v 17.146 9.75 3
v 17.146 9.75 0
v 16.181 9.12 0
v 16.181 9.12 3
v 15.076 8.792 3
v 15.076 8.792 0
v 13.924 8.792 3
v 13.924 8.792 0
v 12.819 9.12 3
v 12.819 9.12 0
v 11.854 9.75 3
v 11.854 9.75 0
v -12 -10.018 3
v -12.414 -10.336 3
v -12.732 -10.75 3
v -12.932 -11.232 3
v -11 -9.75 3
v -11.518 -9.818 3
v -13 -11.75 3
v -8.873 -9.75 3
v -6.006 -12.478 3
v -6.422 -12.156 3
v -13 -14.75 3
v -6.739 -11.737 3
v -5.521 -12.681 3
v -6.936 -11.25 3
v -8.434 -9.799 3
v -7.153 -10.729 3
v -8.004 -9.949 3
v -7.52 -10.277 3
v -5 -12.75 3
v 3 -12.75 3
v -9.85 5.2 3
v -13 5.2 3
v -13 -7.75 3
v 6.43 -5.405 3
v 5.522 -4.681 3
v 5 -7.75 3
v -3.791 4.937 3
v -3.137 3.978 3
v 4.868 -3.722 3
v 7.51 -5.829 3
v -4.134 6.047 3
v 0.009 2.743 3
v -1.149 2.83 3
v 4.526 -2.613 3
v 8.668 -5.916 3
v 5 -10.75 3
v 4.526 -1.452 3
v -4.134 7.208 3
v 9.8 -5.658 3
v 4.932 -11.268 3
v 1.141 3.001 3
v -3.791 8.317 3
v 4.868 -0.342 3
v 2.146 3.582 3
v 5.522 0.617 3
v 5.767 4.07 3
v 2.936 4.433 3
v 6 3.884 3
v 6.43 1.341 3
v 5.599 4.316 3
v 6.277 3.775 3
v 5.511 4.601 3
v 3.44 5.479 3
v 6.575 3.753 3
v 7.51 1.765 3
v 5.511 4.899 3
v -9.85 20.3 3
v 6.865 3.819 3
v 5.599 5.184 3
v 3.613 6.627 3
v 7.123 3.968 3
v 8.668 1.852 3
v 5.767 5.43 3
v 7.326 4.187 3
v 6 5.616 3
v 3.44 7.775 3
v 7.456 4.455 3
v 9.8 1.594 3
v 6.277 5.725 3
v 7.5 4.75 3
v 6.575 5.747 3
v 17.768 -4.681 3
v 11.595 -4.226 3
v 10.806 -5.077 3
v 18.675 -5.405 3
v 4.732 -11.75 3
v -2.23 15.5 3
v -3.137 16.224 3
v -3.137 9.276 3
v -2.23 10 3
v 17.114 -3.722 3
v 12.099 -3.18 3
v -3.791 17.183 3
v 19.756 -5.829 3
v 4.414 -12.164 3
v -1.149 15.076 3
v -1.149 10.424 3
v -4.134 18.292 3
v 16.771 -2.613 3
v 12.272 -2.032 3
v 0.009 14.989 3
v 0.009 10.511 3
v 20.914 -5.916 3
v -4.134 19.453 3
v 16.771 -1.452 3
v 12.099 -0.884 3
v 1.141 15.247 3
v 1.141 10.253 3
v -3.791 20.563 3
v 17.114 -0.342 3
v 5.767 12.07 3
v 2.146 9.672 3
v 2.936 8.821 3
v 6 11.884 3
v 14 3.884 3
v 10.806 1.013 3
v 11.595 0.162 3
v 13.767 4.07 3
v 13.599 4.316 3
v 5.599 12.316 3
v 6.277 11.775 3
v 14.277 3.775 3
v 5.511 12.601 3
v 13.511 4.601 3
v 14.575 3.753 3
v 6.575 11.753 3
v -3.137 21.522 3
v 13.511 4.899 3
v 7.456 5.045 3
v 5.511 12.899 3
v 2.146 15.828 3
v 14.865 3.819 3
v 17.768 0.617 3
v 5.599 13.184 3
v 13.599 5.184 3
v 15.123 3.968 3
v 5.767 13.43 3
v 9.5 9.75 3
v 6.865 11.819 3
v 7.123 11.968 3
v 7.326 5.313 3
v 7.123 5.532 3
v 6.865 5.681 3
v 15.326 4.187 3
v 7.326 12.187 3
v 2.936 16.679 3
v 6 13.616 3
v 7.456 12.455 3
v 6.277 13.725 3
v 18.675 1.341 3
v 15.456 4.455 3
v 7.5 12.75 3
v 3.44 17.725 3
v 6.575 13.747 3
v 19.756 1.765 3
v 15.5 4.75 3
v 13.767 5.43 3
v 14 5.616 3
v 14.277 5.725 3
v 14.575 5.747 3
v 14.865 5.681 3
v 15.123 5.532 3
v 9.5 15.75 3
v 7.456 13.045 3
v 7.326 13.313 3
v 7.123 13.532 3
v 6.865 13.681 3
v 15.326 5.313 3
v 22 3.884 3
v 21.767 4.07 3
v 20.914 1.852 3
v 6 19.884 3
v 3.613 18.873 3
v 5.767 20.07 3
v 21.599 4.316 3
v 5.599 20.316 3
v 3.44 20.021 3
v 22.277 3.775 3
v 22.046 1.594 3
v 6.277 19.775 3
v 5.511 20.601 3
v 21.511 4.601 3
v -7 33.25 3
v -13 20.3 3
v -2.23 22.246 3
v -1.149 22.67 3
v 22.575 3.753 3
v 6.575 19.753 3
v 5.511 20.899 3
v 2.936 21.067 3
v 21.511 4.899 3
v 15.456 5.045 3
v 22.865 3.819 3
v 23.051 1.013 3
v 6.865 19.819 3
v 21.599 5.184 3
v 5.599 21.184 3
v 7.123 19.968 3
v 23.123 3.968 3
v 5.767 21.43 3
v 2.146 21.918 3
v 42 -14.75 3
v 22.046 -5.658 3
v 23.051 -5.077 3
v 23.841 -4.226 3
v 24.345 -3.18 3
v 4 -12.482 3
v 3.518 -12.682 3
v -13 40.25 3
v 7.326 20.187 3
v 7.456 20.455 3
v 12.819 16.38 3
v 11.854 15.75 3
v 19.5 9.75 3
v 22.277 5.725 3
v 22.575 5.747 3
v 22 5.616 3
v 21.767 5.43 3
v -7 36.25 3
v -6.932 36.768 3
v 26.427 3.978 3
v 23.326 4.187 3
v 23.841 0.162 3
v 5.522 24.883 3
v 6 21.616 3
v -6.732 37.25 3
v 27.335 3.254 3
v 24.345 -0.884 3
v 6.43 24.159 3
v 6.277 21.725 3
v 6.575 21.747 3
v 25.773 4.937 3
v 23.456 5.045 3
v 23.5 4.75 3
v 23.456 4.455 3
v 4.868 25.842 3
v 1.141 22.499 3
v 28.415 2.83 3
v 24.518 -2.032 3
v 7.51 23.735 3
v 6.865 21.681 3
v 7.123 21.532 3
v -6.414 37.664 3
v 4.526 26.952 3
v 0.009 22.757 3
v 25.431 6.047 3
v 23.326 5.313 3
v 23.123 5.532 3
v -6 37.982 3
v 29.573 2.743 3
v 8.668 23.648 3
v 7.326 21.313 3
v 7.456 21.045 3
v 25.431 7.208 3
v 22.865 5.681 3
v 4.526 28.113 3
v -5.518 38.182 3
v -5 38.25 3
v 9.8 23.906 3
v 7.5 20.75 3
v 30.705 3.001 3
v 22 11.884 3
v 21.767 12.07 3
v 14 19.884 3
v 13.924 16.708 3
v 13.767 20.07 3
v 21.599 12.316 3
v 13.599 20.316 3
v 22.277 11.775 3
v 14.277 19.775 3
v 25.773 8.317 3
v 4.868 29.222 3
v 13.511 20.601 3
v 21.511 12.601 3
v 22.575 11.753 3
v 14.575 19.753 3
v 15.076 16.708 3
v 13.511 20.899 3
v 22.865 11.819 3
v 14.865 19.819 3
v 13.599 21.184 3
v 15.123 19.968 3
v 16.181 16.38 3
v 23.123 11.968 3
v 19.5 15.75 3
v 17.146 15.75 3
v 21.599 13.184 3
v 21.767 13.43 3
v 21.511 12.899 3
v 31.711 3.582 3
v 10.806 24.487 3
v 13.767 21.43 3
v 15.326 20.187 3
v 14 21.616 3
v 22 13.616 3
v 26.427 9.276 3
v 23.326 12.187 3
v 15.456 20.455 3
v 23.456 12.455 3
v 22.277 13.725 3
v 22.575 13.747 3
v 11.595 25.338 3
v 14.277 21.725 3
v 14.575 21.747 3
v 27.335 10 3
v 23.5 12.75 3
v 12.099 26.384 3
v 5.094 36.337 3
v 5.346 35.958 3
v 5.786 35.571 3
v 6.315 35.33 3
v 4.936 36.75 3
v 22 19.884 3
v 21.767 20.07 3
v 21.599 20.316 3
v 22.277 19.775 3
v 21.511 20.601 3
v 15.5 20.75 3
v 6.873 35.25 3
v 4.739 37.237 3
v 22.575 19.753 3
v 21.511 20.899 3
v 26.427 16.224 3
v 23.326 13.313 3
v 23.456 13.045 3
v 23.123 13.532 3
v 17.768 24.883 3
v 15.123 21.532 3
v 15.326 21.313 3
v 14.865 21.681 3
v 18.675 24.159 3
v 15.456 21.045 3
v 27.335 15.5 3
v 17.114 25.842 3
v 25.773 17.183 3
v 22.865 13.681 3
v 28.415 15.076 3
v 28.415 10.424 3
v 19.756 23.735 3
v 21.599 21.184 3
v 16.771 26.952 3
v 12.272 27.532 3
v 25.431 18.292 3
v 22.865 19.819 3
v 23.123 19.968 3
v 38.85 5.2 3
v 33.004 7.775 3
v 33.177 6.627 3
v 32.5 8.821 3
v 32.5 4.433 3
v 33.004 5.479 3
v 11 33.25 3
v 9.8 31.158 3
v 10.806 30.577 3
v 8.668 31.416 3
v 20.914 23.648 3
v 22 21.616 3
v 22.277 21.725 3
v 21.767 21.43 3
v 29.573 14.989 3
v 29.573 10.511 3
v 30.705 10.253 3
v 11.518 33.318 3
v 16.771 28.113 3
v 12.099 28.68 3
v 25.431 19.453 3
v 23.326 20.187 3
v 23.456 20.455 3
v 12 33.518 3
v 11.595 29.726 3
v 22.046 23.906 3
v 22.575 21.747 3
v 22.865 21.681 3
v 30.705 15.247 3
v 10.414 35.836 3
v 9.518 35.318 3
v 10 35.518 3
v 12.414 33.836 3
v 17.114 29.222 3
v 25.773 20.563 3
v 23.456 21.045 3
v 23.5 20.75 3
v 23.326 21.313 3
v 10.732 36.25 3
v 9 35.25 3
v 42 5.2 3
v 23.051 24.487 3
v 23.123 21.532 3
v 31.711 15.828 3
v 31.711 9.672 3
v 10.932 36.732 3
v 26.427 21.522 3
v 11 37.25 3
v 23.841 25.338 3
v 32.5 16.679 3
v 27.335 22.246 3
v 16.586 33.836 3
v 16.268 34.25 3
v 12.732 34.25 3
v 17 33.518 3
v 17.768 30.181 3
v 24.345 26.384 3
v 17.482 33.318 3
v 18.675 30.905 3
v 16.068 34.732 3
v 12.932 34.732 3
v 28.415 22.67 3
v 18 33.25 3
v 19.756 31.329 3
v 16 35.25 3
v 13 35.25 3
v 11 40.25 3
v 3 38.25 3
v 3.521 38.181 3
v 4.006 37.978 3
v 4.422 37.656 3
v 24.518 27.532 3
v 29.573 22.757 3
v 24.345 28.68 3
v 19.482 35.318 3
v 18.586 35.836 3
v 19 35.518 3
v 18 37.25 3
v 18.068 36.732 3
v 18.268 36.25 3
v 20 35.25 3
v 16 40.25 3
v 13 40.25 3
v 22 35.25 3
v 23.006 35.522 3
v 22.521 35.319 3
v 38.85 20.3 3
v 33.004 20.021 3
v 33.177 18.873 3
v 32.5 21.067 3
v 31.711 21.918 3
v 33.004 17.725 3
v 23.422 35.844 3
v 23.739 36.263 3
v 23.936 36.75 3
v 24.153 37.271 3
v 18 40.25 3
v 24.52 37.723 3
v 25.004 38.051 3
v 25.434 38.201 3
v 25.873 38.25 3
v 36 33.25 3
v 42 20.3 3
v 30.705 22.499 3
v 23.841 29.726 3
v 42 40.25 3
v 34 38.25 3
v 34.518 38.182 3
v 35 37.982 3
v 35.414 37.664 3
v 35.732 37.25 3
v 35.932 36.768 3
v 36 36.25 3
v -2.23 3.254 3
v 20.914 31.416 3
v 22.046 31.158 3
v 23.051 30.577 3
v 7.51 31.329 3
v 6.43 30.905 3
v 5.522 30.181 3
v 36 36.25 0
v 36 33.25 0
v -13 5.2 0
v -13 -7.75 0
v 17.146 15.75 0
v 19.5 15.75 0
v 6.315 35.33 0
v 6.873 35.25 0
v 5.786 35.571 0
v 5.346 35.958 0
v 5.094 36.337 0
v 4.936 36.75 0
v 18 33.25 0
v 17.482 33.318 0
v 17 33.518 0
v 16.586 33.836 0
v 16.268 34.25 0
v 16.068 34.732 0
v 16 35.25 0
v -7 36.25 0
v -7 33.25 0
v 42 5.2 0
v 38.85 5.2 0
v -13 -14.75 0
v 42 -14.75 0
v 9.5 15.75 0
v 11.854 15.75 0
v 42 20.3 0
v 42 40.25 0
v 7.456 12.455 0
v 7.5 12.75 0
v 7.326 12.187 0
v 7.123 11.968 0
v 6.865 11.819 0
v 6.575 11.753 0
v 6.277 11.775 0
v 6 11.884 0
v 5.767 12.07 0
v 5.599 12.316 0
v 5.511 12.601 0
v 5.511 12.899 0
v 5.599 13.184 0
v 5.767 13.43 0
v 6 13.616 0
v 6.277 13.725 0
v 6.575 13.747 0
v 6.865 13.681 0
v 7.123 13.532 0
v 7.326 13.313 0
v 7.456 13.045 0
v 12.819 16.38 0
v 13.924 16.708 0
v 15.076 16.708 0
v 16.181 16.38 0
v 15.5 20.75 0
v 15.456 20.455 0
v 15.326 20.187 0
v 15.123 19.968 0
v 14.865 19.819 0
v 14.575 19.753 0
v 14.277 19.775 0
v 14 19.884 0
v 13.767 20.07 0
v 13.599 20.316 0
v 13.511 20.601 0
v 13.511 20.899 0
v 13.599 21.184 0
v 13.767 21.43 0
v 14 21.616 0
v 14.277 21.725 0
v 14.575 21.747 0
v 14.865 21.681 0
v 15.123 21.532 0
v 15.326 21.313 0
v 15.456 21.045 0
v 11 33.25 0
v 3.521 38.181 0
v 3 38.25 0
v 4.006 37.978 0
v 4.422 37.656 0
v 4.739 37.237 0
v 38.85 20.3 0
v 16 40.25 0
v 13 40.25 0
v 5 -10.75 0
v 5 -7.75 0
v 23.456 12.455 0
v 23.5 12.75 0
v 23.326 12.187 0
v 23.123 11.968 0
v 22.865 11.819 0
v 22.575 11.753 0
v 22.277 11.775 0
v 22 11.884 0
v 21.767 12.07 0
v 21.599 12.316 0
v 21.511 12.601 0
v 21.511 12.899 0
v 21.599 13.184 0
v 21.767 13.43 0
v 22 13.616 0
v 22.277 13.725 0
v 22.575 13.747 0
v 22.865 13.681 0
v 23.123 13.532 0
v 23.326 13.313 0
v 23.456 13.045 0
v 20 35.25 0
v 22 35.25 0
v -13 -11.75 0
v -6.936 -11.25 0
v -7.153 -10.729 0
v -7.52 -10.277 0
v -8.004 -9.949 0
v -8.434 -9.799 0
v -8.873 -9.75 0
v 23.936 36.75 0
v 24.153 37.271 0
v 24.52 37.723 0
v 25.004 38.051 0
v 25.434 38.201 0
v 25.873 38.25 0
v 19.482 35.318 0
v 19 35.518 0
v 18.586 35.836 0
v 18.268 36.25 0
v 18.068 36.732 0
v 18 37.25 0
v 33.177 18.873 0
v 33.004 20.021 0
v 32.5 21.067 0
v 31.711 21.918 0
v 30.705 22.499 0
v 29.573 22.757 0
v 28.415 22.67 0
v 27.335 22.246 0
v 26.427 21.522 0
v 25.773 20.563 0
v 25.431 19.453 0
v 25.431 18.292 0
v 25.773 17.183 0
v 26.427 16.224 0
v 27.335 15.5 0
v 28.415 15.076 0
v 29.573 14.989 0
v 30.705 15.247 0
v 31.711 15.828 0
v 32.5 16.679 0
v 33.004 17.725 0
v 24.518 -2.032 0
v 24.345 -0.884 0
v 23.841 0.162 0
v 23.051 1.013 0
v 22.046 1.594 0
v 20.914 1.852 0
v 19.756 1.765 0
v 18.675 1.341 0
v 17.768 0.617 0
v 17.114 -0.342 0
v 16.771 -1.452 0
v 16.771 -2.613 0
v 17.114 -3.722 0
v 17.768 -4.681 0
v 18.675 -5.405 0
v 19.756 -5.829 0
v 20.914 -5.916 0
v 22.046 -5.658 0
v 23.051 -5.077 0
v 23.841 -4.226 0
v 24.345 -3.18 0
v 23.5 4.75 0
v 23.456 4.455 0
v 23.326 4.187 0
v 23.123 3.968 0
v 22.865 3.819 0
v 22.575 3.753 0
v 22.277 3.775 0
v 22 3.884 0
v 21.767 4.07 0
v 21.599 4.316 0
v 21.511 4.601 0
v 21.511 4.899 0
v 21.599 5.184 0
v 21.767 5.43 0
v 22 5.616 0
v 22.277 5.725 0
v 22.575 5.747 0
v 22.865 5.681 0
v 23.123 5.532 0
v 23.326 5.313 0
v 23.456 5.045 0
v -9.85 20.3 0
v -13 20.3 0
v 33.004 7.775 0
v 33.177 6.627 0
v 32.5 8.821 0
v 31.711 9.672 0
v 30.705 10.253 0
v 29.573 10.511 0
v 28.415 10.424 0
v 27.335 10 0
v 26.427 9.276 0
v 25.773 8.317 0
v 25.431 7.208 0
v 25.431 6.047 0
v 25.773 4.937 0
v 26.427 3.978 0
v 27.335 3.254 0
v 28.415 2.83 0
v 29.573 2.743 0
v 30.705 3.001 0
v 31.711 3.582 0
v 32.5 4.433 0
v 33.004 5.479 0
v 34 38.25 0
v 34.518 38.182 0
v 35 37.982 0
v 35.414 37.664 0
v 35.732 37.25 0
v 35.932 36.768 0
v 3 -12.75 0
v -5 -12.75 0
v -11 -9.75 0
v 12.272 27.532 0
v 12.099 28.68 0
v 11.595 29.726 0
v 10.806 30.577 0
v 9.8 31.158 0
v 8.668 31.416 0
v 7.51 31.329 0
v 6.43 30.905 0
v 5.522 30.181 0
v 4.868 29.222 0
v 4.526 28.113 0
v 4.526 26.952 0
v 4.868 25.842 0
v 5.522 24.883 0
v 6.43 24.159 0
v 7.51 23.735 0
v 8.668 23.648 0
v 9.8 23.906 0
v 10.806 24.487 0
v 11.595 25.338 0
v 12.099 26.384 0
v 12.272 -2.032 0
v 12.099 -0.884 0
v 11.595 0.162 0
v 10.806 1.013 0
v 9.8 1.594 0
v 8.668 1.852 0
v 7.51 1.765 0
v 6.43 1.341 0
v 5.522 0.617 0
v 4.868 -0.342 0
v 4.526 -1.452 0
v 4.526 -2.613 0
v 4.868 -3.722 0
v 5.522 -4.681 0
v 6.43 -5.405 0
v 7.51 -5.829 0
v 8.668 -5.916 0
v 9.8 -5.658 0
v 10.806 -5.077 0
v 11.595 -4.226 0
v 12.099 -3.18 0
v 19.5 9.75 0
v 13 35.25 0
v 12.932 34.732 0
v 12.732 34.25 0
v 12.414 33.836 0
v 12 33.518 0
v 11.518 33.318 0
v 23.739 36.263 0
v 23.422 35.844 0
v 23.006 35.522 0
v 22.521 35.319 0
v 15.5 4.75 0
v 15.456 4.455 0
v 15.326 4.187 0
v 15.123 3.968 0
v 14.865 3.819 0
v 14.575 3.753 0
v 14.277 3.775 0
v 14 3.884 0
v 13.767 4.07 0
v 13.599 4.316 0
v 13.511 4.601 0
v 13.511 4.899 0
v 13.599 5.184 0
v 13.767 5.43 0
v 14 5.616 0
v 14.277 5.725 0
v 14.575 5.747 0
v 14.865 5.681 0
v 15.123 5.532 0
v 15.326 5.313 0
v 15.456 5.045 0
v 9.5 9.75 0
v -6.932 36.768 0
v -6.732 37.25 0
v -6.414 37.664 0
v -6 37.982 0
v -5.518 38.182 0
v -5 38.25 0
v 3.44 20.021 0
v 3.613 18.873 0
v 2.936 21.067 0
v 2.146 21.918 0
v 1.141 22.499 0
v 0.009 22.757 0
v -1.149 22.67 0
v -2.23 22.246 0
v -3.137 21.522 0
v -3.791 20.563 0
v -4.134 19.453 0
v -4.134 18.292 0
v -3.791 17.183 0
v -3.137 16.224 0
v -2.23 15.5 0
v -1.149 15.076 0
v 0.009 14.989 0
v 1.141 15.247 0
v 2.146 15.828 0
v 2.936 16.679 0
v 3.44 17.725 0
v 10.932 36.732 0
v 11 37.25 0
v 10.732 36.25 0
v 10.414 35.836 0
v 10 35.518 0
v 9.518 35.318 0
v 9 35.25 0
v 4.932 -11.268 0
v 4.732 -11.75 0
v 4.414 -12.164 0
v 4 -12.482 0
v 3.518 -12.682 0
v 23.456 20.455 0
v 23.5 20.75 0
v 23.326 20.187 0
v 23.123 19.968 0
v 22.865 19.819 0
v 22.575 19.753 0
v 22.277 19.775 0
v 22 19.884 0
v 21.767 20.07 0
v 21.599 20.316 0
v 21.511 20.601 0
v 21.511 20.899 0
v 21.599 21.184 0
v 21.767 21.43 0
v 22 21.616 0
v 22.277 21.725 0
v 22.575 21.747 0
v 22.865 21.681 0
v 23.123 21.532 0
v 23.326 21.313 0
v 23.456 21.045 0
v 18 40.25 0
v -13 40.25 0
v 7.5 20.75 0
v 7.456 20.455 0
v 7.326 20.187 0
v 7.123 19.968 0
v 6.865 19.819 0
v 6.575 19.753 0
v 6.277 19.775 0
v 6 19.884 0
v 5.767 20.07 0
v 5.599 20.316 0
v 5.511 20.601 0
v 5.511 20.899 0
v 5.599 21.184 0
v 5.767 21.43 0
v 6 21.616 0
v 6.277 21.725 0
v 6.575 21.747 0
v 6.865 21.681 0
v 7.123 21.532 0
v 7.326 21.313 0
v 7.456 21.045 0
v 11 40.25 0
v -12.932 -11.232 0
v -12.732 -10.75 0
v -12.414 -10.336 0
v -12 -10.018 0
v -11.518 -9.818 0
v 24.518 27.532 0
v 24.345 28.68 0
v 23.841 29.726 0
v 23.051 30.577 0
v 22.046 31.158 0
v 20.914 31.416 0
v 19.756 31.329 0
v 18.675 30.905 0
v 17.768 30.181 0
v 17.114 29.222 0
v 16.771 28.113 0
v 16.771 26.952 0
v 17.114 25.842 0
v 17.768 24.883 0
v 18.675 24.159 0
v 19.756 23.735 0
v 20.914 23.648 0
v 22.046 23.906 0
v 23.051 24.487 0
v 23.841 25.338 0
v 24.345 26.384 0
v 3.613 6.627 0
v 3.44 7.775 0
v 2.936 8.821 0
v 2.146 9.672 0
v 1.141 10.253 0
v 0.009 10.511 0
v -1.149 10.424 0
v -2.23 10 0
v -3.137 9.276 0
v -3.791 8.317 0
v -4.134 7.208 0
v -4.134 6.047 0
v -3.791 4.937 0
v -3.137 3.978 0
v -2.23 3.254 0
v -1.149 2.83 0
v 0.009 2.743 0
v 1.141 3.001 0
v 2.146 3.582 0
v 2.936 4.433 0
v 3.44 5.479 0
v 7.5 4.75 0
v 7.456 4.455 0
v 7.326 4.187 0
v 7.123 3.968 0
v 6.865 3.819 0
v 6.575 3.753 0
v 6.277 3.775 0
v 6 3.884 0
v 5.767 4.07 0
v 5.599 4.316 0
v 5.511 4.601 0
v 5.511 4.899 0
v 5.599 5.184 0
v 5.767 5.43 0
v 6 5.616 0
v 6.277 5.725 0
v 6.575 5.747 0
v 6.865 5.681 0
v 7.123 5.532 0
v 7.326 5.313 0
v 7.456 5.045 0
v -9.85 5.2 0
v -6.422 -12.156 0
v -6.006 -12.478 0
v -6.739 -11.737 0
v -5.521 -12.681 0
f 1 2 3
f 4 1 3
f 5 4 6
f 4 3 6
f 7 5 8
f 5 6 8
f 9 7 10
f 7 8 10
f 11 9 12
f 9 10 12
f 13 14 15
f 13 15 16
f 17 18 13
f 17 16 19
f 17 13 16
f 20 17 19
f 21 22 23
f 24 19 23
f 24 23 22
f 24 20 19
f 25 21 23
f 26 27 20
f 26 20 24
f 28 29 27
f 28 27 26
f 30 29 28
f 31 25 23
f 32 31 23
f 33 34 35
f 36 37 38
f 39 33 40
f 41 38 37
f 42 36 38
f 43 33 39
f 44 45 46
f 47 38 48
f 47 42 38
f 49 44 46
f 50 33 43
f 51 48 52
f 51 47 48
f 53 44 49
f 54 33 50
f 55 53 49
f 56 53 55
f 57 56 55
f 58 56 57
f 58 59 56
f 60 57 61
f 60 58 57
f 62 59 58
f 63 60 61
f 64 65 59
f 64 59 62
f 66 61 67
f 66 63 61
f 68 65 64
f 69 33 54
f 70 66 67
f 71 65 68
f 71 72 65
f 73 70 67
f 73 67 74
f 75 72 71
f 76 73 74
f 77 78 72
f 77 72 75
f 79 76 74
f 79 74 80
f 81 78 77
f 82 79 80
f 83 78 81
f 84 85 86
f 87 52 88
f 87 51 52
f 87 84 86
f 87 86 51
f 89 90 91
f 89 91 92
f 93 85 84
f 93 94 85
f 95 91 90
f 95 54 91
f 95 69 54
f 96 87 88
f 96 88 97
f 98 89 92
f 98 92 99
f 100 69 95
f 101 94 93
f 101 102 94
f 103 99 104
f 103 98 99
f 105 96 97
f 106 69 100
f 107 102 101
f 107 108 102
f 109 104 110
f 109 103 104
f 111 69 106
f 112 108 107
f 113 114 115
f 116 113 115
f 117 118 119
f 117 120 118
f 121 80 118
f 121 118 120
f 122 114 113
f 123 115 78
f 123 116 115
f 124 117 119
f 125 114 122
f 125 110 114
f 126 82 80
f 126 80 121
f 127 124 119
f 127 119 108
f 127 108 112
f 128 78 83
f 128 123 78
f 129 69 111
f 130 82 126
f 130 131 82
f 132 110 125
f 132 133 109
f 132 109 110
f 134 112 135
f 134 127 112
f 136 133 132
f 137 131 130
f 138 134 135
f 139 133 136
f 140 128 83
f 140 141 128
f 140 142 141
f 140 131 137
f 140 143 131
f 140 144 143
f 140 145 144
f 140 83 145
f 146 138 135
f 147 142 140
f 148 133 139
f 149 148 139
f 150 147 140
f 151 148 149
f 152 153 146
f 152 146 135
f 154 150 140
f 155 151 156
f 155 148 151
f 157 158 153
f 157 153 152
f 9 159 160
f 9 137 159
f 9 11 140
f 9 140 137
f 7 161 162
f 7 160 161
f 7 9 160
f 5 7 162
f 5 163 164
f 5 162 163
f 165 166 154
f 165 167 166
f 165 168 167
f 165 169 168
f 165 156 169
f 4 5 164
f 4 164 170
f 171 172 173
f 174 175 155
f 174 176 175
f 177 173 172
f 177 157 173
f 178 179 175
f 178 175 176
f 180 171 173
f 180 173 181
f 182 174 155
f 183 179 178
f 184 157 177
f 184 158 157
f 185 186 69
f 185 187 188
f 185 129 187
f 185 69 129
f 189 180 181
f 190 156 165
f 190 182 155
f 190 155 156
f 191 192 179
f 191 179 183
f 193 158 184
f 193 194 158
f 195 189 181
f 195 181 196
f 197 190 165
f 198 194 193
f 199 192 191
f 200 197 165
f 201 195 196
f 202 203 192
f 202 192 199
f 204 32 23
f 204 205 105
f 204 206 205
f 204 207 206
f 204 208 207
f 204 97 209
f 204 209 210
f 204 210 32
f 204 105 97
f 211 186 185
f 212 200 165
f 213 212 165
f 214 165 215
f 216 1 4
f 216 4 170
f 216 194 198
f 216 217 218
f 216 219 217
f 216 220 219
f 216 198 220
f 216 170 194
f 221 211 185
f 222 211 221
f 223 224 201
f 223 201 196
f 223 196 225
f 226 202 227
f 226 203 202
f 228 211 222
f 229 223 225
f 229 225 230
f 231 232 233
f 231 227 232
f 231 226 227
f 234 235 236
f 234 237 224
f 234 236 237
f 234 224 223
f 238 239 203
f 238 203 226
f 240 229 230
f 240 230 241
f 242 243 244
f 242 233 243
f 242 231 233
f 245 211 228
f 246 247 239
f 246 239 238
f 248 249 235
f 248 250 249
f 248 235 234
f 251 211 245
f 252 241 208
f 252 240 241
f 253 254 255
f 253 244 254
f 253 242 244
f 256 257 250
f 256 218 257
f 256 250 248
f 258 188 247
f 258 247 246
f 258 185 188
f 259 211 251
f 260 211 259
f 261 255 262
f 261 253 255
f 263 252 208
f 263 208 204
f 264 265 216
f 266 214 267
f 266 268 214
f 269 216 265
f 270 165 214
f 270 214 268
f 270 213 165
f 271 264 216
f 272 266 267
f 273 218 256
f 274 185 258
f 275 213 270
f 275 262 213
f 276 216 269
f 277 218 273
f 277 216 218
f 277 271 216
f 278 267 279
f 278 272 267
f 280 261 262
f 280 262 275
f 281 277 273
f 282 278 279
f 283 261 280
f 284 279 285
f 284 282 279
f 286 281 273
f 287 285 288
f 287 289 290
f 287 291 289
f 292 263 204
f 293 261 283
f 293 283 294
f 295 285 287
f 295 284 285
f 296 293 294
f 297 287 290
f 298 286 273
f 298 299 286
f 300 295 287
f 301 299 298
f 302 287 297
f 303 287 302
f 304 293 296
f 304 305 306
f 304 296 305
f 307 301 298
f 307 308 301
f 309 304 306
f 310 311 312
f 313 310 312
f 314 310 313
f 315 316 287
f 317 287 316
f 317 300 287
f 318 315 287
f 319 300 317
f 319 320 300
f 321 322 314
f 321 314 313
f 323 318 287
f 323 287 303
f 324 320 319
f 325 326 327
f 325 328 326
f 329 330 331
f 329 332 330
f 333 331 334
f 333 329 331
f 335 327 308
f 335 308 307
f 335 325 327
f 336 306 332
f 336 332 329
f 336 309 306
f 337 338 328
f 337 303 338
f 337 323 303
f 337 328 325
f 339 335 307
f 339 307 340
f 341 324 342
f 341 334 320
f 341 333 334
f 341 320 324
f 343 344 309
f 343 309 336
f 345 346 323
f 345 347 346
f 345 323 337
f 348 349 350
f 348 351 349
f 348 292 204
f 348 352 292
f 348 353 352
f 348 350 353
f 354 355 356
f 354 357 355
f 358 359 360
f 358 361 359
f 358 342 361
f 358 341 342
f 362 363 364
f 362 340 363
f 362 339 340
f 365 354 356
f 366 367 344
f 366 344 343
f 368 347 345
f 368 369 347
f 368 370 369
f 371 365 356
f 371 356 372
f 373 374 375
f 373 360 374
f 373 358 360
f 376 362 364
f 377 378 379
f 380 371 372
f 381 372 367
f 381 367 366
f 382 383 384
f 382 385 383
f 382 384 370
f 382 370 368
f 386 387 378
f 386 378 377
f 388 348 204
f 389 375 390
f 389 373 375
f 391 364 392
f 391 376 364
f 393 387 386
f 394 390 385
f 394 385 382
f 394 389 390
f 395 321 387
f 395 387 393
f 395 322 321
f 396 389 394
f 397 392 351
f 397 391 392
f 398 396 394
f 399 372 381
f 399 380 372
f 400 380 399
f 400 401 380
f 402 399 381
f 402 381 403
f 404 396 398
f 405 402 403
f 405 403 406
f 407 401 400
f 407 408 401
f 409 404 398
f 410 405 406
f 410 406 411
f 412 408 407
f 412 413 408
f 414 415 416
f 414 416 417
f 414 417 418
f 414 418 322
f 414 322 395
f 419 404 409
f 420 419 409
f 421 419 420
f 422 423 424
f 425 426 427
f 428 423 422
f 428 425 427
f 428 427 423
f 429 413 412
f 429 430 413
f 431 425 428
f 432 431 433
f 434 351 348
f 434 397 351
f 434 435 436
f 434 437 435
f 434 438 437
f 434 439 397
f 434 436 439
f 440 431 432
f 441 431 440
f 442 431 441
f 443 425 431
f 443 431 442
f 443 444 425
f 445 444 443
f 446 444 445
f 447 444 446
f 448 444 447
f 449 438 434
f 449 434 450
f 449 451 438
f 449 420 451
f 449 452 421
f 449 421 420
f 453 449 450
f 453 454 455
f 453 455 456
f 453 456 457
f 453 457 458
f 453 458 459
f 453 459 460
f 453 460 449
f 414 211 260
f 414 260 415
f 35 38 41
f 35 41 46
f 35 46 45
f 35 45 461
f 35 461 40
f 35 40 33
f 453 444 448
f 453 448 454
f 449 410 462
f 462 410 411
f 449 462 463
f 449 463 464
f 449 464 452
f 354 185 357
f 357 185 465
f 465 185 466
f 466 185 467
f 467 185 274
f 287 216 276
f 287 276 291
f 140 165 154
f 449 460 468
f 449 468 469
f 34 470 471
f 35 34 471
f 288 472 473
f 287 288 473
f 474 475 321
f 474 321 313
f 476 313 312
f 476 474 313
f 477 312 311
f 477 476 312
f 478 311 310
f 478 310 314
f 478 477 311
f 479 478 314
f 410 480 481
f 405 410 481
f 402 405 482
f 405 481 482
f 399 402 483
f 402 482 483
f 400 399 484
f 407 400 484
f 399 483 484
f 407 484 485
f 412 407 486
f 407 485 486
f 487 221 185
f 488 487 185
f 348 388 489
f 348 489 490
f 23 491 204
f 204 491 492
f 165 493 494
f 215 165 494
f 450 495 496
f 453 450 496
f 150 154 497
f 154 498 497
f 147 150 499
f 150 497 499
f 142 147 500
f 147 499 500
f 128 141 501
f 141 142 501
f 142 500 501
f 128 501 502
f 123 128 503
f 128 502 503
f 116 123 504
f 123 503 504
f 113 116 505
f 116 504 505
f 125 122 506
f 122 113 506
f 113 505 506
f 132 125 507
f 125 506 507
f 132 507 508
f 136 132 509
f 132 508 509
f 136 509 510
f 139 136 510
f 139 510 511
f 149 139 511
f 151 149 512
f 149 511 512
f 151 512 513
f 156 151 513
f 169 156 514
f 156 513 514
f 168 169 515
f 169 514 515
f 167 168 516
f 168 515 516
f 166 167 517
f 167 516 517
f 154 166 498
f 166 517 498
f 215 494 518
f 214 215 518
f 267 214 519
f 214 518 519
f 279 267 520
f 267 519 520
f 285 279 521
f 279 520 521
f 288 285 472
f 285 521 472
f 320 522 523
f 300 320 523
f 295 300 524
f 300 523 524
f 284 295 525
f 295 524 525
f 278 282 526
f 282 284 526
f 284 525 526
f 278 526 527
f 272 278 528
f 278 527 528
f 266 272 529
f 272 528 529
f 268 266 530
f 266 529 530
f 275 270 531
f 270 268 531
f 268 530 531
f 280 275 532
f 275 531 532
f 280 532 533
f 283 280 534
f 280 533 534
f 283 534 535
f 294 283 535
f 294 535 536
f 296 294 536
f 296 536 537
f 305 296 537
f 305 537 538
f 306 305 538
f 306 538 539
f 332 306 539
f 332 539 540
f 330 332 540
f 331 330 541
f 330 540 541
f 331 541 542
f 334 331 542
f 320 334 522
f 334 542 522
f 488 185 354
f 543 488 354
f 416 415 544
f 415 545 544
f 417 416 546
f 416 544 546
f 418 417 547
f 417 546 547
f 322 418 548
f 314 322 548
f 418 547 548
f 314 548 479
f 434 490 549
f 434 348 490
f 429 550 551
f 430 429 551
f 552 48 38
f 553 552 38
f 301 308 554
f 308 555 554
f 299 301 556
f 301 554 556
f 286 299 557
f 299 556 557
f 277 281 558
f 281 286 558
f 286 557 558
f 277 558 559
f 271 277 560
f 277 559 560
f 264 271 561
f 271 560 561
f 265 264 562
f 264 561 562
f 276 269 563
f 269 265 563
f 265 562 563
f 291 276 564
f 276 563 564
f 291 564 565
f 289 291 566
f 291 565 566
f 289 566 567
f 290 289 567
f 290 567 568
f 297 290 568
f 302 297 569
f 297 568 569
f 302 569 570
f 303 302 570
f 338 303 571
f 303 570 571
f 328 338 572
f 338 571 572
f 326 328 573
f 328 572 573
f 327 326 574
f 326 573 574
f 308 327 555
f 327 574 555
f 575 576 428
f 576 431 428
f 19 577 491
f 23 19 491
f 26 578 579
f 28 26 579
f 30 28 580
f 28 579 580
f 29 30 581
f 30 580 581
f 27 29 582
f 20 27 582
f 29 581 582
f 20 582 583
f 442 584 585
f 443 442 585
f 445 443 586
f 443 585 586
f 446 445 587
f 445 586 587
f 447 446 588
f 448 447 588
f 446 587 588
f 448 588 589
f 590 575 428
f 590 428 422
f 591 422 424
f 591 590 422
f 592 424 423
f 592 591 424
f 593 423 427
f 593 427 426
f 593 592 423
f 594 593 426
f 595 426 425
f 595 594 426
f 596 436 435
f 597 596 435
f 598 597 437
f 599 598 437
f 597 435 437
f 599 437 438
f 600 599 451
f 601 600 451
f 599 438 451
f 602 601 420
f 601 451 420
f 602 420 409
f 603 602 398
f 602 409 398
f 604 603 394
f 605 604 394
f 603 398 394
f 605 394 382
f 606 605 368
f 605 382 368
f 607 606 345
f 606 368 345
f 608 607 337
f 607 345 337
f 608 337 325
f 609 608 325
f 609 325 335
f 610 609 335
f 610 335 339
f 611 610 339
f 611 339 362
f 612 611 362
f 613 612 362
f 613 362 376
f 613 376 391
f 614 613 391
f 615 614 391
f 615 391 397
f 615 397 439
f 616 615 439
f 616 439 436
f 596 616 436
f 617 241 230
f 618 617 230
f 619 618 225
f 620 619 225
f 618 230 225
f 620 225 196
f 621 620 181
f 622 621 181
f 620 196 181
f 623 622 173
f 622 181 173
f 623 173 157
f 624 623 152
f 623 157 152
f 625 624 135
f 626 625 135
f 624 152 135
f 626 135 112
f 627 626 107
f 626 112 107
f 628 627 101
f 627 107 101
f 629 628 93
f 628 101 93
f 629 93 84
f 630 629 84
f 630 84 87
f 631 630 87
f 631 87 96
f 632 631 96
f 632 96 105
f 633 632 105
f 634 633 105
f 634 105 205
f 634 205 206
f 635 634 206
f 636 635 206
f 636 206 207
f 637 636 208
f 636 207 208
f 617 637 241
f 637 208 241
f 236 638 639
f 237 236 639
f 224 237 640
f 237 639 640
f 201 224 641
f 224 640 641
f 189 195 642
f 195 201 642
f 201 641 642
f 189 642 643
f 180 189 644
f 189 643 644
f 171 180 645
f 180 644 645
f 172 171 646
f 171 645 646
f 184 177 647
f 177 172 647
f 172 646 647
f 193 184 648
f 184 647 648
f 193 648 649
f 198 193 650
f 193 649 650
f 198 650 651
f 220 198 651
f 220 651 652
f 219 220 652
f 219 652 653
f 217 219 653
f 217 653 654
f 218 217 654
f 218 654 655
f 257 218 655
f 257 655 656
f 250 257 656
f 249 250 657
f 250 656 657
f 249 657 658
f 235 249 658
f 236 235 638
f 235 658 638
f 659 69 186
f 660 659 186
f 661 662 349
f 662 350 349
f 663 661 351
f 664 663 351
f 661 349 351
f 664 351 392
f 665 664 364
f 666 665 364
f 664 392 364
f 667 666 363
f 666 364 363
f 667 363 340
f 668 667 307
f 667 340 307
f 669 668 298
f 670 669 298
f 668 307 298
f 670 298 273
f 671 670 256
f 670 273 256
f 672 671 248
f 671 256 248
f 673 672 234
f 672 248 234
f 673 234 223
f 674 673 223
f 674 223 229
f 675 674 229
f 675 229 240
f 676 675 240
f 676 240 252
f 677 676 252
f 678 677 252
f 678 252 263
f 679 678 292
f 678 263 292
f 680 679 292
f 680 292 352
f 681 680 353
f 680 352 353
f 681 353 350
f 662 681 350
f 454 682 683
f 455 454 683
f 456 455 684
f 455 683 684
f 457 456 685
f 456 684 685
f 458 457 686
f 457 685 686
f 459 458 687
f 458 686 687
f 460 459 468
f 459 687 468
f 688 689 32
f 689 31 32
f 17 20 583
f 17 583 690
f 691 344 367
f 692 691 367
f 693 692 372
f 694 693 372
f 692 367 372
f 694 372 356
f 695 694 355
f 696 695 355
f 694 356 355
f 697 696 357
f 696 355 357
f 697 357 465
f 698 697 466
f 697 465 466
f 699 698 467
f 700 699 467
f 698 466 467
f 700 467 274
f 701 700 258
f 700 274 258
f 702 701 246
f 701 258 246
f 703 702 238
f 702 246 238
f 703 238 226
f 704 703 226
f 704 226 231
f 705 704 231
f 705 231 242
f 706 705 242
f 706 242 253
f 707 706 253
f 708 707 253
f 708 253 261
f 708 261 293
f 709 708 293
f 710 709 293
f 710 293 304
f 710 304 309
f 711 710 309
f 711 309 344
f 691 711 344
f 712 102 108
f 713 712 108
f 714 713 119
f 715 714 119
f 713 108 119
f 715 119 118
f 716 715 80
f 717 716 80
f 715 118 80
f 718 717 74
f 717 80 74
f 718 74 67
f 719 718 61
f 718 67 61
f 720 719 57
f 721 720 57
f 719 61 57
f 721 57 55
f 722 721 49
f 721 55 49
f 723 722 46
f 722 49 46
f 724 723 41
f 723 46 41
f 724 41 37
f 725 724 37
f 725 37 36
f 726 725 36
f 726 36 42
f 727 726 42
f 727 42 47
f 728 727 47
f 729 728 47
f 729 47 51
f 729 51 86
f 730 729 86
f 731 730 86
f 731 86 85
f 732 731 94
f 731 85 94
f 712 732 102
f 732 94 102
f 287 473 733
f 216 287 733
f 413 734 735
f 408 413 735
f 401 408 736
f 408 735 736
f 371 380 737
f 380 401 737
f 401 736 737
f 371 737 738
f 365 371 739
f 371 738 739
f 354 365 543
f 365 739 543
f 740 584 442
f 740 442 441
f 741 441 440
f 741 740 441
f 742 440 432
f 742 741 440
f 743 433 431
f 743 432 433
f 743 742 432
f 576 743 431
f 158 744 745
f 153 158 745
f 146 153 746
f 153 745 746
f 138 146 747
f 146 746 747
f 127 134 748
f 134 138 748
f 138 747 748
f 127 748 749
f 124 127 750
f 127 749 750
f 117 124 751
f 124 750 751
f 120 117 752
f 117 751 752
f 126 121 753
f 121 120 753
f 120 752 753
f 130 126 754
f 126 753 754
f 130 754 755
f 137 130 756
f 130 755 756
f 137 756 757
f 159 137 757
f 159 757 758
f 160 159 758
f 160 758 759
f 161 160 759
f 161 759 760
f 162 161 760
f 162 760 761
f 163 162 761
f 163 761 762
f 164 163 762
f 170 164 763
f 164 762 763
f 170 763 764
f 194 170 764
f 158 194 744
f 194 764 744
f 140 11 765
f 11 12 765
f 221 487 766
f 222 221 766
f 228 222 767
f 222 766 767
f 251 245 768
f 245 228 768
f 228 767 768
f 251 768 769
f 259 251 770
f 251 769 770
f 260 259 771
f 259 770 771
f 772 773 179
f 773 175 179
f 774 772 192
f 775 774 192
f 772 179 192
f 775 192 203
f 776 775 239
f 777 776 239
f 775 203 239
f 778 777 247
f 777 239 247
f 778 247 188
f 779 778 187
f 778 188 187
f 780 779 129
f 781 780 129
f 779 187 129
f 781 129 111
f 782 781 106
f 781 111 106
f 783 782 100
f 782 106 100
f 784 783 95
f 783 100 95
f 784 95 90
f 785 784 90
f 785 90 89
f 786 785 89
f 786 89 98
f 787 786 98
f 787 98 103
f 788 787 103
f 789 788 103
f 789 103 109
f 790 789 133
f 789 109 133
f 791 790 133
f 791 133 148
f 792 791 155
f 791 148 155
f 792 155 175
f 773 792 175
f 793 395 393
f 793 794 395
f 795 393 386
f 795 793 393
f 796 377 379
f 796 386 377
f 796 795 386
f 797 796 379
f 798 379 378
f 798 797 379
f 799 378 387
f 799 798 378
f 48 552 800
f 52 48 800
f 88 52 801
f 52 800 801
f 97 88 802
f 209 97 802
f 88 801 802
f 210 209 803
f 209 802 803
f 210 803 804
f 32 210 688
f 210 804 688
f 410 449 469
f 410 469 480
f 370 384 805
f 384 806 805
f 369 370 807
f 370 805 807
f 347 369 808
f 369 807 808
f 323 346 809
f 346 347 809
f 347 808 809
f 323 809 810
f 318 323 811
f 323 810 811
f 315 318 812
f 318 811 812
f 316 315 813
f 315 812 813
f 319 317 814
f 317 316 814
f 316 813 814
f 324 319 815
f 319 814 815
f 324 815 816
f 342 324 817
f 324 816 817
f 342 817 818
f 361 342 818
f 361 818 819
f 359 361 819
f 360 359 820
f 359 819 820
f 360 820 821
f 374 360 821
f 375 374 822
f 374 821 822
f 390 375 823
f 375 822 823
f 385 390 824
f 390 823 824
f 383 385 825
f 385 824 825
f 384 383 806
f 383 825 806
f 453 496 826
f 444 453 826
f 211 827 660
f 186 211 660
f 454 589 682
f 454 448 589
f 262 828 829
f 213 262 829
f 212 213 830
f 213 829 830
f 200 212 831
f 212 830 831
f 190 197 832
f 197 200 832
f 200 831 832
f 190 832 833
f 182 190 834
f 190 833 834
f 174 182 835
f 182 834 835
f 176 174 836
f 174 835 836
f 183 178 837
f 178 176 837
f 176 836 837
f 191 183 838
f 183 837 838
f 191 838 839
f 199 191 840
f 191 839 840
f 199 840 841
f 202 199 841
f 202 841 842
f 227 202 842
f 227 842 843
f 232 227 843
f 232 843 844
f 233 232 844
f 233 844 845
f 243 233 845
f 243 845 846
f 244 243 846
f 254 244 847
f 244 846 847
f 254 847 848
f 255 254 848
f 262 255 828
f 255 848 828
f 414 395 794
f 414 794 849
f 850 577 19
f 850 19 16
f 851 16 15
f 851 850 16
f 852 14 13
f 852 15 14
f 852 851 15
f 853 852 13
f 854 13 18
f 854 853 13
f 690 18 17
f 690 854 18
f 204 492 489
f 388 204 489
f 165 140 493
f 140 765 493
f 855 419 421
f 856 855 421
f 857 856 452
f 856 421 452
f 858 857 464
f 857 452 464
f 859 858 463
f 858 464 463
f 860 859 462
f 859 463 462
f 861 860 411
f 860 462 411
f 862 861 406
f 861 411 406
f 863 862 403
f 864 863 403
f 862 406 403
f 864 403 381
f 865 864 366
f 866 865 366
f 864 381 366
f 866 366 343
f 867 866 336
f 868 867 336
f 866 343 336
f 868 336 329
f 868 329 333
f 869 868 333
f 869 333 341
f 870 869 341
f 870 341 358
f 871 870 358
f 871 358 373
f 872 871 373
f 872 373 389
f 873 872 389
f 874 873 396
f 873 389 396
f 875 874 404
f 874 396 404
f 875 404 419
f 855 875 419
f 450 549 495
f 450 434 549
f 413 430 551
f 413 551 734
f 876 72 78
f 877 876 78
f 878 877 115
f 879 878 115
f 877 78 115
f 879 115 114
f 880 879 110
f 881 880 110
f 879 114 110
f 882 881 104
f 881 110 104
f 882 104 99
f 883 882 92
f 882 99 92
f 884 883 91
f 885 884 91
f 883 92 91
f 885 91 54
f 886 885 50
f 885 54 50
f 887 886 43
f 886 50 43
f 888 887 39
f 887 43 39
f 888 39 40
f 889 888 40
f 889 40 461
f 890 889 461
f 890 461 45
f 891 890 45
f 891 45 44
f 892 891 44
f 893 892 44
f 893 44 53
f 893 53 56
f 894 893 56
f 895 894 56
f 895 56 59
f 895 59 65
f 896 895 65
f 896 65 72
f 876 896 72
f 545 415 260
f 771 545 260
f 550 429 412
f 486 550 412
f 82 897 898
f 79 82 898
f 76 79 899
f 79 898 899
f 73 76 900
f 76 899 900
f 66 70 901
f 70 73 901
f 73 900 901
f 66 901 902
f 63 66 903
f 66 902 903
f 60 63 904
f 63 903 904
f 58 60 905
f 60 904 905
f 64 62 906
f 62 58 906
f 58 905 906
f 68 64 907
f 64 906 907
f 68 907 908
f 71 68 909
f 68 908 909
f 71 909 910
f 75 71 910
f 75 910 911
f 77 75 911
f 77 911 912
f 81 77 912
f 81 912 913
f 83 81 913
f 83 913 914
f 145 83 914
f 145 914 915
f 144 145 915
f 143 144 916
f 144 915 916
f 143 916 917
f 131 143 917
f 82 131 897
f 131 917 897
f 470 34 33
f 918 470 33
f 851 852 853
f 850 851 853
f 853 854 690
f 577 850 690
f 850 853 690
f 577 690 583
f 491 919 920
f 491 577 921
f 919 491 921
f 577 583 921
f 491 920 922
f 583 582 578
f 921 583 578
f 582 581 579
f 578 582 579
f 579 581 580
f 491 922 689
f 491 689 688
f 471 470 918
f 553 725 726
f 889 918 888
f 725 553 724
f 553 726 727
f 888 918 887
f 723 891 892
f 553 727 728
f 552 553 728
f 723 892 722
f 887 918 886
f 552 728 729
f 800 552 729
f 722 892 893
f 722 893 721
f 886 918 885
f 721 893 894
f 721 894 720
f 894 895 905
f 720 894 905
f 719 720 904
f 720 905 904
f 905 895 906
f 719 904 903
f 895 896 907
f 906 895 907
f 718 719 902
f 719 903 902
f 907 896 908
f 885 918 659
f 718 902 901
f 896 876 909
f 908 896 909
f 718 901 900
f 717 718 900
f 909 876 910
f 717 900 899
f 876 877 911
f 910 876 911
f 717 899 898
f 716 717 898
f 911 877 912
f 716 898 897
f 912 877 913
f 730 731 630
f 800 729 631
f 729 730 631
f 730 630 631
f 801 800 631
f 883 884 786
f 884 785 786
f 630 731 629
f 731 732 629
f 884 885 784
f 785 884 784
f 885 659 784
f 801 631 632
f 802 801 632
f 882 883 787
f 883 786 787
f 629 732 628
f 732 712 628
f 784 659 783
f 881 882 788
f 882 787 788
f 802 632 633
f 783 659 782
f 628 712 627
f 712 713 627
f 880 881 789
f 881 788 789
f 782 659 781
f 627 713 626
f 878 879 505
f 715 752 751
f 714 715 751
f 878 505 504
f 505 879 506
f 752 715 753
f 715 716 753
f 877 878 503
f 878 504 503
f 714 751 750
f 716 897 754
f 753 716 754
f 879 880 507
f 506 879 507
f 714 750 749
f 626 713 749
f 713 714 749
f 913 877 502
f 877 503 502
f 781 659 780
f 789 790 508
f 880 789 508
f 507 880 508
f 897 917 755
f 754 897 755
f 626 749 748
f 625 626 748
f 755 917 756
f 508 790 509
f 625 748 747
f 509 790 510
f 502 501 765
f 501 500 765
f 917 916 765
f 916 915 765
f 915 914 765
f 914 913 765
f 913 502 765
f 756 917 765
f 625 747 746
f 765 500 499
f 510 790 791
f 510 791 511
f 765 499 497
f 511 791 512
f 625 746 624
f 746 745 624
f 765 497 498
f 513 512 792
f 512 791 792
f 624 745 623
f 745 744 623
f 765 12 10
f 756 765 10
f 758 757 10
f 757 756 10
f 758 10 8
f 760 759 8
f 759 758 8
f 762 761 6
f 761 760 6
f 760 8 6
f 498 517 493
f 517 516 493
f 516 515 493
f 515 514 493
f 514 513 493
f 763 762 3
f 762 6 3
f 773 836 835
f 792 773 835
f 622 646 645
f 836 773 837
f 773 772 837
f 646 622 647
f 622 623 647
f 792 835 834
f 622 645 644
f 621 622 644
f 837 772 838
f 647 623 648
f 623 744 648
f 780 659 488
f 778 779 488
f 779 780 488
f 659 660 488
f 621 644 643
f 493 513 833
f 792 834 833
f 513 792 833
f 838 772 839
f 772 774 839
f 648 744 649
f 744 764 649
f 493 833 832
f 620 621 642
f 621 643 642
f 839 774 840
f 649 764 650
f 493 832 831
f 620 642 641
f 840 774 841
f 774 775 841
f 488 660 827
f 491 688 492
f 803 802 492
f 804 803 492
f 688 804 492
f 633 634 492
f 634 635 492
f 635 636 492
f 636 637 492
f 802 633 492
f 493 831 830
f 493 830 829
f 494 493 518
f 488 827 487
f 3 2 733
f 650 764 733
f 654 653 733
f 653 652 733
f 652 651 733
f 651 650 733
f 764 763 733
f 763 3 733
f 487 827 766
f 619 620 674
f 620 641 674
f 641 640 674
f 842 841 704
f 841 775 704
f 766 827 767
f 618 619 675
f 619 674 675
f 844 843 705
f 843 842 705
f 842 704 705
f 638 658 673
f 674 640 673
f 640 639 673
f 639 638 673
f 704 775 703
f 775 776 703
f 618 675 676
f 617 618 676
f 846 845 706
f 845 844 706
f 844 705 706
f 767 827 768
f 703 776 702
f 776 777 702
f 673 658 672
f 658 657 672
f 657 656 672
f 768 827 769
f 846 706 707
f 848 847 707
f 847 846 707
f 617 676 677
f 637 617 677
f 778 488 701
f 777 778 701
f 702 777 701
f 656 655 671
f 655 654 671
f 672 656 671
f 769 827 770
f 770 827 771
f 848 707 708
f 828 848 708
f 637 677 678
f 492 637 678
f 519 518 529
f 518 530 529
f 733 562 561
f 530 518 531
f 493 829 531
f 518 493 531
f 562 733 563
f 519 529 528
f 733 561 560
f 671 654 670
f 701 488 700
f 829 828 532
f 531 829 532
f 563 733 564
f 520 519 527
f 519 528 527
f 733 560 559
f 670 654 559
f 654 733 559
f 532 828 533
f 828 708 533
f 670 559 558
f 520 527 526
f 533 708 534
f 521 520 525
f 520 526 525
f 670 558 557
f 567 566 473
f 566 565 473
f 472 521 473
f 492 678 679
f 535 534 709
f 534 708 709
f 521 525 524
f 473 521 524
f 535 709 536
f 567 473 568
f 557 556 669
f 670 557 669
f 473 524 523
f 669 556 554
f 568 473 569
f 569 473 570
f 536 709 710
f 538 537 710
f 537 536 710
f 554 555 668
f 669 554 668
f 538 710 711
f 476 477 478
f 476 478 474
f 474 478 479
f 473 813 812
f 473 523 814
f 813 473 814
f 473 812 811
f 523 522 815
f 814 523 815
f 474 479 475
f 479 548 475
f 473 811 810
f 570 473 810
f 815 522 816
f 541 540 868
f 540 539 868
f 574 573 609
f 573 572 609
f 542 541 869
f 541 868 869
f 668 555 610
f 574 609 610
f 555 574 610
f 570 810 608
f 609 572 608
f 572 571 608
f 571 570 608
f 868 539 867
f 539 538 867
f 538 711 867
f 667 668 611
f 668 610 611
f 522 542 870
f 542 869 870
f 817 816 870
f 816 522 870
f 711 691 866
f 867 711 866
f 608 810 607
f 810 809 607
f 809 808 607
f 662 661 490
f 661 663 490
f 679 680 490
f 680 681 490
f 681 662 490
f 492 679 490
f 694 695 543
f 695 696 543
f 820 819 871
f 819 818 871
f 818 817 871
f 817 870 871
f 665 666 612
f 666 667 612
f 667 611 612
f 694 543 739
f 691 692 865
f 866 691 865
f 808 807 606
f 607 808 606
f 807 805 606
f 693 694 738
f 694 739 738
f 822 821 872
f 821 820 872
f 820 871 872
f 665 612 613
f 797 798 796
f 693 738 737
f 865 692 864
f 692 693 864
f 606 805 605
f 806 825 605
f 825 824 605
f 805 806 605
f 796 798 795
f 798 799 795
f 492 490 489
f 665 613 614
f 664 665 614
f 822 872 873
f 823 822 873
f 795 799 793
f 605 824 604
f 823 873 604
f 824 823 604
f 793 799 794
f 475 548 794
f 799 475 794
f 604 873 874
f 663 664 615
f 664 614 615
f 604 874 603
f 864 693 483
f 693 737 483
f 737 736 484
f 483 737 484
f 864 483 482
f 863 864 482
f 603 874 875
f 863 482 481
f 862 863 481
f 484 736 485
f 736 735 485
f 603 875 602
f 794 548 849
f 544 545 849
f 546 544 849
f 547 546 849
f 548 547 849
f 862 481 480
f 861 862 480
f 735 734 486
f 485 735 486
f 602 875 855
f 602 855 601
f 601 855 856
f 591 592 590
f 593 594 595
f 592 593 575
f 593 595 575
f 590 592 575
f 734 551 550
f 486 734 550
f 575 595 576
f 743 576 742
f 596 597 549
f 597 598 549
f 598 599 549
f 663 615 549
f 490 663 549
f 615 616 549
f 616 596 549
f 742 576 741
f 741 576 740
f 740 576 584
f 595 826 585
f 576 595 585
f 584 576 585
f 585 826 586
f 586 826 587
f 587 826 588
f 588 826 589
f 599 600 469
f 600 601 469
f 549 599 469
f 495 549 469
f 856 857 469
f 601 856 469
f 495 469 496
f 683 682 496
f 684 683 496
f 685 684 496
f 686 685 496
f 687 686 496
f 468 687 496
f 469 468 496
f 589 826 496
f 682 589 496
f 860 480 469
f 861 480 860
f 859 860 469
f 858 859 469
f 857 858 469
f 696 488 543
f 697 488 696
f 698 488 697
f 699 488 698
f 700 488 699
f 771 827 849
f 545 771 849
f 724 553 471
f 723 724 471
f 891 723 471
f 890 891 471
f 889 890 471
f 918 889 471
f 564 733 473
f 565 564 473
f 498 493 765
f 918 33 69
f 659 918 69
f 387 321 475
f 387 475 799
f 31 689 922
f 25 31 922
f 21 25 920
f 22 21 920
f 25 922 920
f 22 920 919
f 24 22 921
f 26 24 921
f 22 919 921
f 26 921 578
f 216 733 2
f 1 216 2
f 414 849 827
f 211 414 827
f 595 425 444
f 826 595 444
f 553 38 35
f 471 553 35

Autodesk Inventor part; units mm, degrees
ref_plane "YZ Plane" through (0, 0, 0) normal (1, 0, 0) x (0, 1, 0)
ref_plane "XZ Plane" through (0, 0, 0) normal (0, 1, 0) x (-1, 0, 0)
ref_plane "XY Plane" through (0, 0, 0) normal (0, 0, 1) x (1, 0, 0)
ref_plane "Work Plane1" through (0, 0, 0) normal (0, 0, 1) x (1, 0, 0)
sketch "Sketch1" plane through (0, 0, 0) normal (0, 0, 1) x (1, 0, 0)
  circle A0 centre (6.5, 20.75) radius 1
  circle A1 centre (6.5, 4.75) radius 1
  circle A2 centre (22.5, 20.75) radius 1
  circle A3 centre (22.5, 4.75) radius 1
  line L0 (-13, -14.75) -> (42, -14.75)
  line L1 (42, -14.75) -> (42, 40.25)
  line L2 (42, 40.25) -> (-13, 40.25)
  line L3 (-13, 40.25) -> (-13, -14.75)
  line L4 (-13, -14.75) -> (42, 40.25) construction
  line L5 (42, -14.75) -> (-13, 40.25) construction
  circle A4 centre (22.5, 12.75) radius 1 projected
  circle A5 centre (14.5, 20.75) radius 1 projected
  circle A6 centre (14.5, 4.75) radius 1 projected
  circle A7 centre (6.5, 12.75) radius 1 projected
  line L6 (19.5, 15.75) -> (19.5, 9.75)
  line L7 (17.1458, 15.75) -> (19.5, 15.75)
  arc A8 (17.1458, 15.75) -> (11.8542, 15.75) centre (14.5, 12.75) ccw
  line L8 (9.5, 15.75) -> (11.8542, 15.75)
  line L9 (9.5, 9.75) -> (9.5, 15.75)
  line L10 (11.8542, 9.75) -> (9.5, 9.75)
  arc A9 (11.8542, 9.75) -> (17.1458, 9.75) centre (14.5, 12.75) ccw
  line L11 (19.5, 9.75) -> (17.1458, 9.75)
  point P0 (0, 0)
  dimension "d0" = 55
  dimension "d1" = 55
  dimension "d95" = 2
  dimension "d96" = 2
  dimension "d97" = 2
  dimension "d98" = 2
extrude "Extrusion3" add sketch "Sketch1" along normal blind 3
sketch "Sketch4" plane through (0, 0, 3) normal (0, 0, 1) x (1, 0, 0)
  line L0 (14.5, 40.25) -> (14.5, 12.75) construction
  line L1 (-13, -14.75) -> (42, -14.75) construction
  line L2 (-13, 12.75) -> (14.5, 12.75) construction
  line L3 (5, 38.25) -> (-7, 38.25)
  line L4 (-7, 38.25) -> (-7, 33.25)
  line L5 (-7, 33.25) -> (13, 33.25)
  line L6 (13, 40.25) -> (13, 33.25)
  line L7 (-7, -12.75) -> (5, -12.75)
  line L8 (5, -12.75) -> (5, -7.75)
  line L9 (5, -7.75) -> (-13, -7.75)
  line L10 (-13, -14.75) -> (-13, -7.75)
  line L11 (-13, -14.75) -> (5.3284, -14.75)
  line L12 (14.5, 12.75) -> (20.6229, 27.5321)
  line L13 (14.5, 12.75) -> (30.5, 12.75) construction
  circle A0 centre (20.6229, 27.5321) radius 3.895
  circle A1 centre (8.3771, 27.5321) radius 3.895
  circle A2 centre (-0.2821, 18.8729) radius 3.895
  circle A3 centre (-0.2821, 6.6271) radius 3.895
  circle A4 centre (8.3771, -2.0321) radius 3.895
  circle A5 centre (20.6229, -2.0321) radius 3.895
  circle A6 centre (29.2821, 6.6271) radius 3.895
  circle A7 centre (29.2821, 18.8729) radius 3.895
  line L14 (-7, -12.75) -> (-7, -9.75)
  line L15 (-7, -9.75) -> (-13, -9.75)
  line L16 (-13, 40.25) -> (-13, -14.75) projected
  line L17 (-13, -7.75) -> (-13, -9.75)
  line L18 (-13, 40.25) -> (-13, -14.75) projected
  line L19 (5, 38.25) -> (5, 35.25)
  line L20 (5, 35.25) -> (11, 35.25)
  line L21 (11, 35.25) -> (11, 40.25)
  line L22 (42, 40.25) -> (-13, 40.25) projected
  line L23 (42, 40.25) -> (-13, 40.25) projected
  line L24 (11, 40.25) -> (13, 40.25)
  line L25 (24, 38.25) -> (36, 38.25)
  line L26 (36, 38.25) -> (36, 33.25)
  line L27 (36, 33.25) -> (16, 33.25)
  line L28 (16, 40.25) -> (16, 33.25)
  line L29 (24, 38.25) -> (24, 35.25)
  line L30 (24, 35.25) -> (18, 35.25)
  line L31 (18, 35.25) -> (18, 40.25)
  line L32 (18, 40.25) -> (16, 40.25)
  point P0 (0, 0)
  dimension "d99" = 16
  dimension "d100" = 67.5
  dimension "d101" = 7.79
  dimension "d104" = 360
  dimension "d106" = 2
  dimension "d107" = 5
  dimension "d108" = 2
  dimension "d109" = 12
  dimension "d110" = 18
  dimension "d111" = 6
  dimension "d112" = 20
  dimension "d113" = 12
  dimension "d114" = 6
  dimension "d115" = 5
  dimension "d117" = 2
  dimension "d118" = 2
extrude "Extrusion2" cut sketch "Sketch4" against normal through all
fillet "Fillet3" radius 2 14 edges at (-7, 38.25, 1.5) (5, 38.25, 1.5) (13, 33.25, 1.5) (5, -12.75, 1.5) (-7, -12.75, 1.5) (-7, -9.75, 1.5) (-13, -9.75, 1.5) (5, 35.25, 1.5) (11, 35.25, 1.5) (18, 35.25, 1.5) (24, 35.25, 1.5) (24, 38.25, 1.5) (36, 38.25, 1.5) (16, 33.25, 1.5)
sketch "Sketch6" plane through (0, 0, 3) normal (0, 0, 1) x (1, 0, 0)
  line L0 (38.85, 20.3) -> (42, 20.3)
  line L1 (42, 20.3) -> (42, 5.2)
  line L2 (42, 5.2) -> (38.85, 5.2)
  line L3 (38.85, 5.2) -> (38.85, 20.3)
  line L4 (42, -14.75) -> (42, 40.25) projected
  line L5 (42, 40.25) -> (-13, 40.25) construction
  line L6 (14.5, 40.25) -> (14.5, -14.75) construction
  line L7 (-13, -14.75) -> (42, -14.75) construction
  line L8 (-9.85, 20.3) -> (-13, 20.3)
  line L9 (-13, 5.2) -> (-9.85, 5.2)
  line L10 (-9.85, 5.2) -> (-9.85, 20.3)
  line L11 (-13, 12.75) -> (42, 12.75) construction
  line L12 (-13, 20.3) -> (-13, 5.2)
  line L13 (-13, 40.25) -> (-13, -14.75) projected
  point P0 (0, 0)
  point P1 (42, 12.75)
  point P2 (18.0284, 40.25)
  point P3 (13, 40.25)
  point P4 (5.3284, -14.75)
  point P5 (-13, 12.75)
  point P6 (-13, -7.75)
  dimension "d91" = 3.15
  dimension "d92" = 15.1
extrude "Extrusion4" cut sketch "Sketch6" against normal through all
equation "\"d38\" = d24"
equation "\"d24\" = 7.79"
properties part number "BottomRotated"
